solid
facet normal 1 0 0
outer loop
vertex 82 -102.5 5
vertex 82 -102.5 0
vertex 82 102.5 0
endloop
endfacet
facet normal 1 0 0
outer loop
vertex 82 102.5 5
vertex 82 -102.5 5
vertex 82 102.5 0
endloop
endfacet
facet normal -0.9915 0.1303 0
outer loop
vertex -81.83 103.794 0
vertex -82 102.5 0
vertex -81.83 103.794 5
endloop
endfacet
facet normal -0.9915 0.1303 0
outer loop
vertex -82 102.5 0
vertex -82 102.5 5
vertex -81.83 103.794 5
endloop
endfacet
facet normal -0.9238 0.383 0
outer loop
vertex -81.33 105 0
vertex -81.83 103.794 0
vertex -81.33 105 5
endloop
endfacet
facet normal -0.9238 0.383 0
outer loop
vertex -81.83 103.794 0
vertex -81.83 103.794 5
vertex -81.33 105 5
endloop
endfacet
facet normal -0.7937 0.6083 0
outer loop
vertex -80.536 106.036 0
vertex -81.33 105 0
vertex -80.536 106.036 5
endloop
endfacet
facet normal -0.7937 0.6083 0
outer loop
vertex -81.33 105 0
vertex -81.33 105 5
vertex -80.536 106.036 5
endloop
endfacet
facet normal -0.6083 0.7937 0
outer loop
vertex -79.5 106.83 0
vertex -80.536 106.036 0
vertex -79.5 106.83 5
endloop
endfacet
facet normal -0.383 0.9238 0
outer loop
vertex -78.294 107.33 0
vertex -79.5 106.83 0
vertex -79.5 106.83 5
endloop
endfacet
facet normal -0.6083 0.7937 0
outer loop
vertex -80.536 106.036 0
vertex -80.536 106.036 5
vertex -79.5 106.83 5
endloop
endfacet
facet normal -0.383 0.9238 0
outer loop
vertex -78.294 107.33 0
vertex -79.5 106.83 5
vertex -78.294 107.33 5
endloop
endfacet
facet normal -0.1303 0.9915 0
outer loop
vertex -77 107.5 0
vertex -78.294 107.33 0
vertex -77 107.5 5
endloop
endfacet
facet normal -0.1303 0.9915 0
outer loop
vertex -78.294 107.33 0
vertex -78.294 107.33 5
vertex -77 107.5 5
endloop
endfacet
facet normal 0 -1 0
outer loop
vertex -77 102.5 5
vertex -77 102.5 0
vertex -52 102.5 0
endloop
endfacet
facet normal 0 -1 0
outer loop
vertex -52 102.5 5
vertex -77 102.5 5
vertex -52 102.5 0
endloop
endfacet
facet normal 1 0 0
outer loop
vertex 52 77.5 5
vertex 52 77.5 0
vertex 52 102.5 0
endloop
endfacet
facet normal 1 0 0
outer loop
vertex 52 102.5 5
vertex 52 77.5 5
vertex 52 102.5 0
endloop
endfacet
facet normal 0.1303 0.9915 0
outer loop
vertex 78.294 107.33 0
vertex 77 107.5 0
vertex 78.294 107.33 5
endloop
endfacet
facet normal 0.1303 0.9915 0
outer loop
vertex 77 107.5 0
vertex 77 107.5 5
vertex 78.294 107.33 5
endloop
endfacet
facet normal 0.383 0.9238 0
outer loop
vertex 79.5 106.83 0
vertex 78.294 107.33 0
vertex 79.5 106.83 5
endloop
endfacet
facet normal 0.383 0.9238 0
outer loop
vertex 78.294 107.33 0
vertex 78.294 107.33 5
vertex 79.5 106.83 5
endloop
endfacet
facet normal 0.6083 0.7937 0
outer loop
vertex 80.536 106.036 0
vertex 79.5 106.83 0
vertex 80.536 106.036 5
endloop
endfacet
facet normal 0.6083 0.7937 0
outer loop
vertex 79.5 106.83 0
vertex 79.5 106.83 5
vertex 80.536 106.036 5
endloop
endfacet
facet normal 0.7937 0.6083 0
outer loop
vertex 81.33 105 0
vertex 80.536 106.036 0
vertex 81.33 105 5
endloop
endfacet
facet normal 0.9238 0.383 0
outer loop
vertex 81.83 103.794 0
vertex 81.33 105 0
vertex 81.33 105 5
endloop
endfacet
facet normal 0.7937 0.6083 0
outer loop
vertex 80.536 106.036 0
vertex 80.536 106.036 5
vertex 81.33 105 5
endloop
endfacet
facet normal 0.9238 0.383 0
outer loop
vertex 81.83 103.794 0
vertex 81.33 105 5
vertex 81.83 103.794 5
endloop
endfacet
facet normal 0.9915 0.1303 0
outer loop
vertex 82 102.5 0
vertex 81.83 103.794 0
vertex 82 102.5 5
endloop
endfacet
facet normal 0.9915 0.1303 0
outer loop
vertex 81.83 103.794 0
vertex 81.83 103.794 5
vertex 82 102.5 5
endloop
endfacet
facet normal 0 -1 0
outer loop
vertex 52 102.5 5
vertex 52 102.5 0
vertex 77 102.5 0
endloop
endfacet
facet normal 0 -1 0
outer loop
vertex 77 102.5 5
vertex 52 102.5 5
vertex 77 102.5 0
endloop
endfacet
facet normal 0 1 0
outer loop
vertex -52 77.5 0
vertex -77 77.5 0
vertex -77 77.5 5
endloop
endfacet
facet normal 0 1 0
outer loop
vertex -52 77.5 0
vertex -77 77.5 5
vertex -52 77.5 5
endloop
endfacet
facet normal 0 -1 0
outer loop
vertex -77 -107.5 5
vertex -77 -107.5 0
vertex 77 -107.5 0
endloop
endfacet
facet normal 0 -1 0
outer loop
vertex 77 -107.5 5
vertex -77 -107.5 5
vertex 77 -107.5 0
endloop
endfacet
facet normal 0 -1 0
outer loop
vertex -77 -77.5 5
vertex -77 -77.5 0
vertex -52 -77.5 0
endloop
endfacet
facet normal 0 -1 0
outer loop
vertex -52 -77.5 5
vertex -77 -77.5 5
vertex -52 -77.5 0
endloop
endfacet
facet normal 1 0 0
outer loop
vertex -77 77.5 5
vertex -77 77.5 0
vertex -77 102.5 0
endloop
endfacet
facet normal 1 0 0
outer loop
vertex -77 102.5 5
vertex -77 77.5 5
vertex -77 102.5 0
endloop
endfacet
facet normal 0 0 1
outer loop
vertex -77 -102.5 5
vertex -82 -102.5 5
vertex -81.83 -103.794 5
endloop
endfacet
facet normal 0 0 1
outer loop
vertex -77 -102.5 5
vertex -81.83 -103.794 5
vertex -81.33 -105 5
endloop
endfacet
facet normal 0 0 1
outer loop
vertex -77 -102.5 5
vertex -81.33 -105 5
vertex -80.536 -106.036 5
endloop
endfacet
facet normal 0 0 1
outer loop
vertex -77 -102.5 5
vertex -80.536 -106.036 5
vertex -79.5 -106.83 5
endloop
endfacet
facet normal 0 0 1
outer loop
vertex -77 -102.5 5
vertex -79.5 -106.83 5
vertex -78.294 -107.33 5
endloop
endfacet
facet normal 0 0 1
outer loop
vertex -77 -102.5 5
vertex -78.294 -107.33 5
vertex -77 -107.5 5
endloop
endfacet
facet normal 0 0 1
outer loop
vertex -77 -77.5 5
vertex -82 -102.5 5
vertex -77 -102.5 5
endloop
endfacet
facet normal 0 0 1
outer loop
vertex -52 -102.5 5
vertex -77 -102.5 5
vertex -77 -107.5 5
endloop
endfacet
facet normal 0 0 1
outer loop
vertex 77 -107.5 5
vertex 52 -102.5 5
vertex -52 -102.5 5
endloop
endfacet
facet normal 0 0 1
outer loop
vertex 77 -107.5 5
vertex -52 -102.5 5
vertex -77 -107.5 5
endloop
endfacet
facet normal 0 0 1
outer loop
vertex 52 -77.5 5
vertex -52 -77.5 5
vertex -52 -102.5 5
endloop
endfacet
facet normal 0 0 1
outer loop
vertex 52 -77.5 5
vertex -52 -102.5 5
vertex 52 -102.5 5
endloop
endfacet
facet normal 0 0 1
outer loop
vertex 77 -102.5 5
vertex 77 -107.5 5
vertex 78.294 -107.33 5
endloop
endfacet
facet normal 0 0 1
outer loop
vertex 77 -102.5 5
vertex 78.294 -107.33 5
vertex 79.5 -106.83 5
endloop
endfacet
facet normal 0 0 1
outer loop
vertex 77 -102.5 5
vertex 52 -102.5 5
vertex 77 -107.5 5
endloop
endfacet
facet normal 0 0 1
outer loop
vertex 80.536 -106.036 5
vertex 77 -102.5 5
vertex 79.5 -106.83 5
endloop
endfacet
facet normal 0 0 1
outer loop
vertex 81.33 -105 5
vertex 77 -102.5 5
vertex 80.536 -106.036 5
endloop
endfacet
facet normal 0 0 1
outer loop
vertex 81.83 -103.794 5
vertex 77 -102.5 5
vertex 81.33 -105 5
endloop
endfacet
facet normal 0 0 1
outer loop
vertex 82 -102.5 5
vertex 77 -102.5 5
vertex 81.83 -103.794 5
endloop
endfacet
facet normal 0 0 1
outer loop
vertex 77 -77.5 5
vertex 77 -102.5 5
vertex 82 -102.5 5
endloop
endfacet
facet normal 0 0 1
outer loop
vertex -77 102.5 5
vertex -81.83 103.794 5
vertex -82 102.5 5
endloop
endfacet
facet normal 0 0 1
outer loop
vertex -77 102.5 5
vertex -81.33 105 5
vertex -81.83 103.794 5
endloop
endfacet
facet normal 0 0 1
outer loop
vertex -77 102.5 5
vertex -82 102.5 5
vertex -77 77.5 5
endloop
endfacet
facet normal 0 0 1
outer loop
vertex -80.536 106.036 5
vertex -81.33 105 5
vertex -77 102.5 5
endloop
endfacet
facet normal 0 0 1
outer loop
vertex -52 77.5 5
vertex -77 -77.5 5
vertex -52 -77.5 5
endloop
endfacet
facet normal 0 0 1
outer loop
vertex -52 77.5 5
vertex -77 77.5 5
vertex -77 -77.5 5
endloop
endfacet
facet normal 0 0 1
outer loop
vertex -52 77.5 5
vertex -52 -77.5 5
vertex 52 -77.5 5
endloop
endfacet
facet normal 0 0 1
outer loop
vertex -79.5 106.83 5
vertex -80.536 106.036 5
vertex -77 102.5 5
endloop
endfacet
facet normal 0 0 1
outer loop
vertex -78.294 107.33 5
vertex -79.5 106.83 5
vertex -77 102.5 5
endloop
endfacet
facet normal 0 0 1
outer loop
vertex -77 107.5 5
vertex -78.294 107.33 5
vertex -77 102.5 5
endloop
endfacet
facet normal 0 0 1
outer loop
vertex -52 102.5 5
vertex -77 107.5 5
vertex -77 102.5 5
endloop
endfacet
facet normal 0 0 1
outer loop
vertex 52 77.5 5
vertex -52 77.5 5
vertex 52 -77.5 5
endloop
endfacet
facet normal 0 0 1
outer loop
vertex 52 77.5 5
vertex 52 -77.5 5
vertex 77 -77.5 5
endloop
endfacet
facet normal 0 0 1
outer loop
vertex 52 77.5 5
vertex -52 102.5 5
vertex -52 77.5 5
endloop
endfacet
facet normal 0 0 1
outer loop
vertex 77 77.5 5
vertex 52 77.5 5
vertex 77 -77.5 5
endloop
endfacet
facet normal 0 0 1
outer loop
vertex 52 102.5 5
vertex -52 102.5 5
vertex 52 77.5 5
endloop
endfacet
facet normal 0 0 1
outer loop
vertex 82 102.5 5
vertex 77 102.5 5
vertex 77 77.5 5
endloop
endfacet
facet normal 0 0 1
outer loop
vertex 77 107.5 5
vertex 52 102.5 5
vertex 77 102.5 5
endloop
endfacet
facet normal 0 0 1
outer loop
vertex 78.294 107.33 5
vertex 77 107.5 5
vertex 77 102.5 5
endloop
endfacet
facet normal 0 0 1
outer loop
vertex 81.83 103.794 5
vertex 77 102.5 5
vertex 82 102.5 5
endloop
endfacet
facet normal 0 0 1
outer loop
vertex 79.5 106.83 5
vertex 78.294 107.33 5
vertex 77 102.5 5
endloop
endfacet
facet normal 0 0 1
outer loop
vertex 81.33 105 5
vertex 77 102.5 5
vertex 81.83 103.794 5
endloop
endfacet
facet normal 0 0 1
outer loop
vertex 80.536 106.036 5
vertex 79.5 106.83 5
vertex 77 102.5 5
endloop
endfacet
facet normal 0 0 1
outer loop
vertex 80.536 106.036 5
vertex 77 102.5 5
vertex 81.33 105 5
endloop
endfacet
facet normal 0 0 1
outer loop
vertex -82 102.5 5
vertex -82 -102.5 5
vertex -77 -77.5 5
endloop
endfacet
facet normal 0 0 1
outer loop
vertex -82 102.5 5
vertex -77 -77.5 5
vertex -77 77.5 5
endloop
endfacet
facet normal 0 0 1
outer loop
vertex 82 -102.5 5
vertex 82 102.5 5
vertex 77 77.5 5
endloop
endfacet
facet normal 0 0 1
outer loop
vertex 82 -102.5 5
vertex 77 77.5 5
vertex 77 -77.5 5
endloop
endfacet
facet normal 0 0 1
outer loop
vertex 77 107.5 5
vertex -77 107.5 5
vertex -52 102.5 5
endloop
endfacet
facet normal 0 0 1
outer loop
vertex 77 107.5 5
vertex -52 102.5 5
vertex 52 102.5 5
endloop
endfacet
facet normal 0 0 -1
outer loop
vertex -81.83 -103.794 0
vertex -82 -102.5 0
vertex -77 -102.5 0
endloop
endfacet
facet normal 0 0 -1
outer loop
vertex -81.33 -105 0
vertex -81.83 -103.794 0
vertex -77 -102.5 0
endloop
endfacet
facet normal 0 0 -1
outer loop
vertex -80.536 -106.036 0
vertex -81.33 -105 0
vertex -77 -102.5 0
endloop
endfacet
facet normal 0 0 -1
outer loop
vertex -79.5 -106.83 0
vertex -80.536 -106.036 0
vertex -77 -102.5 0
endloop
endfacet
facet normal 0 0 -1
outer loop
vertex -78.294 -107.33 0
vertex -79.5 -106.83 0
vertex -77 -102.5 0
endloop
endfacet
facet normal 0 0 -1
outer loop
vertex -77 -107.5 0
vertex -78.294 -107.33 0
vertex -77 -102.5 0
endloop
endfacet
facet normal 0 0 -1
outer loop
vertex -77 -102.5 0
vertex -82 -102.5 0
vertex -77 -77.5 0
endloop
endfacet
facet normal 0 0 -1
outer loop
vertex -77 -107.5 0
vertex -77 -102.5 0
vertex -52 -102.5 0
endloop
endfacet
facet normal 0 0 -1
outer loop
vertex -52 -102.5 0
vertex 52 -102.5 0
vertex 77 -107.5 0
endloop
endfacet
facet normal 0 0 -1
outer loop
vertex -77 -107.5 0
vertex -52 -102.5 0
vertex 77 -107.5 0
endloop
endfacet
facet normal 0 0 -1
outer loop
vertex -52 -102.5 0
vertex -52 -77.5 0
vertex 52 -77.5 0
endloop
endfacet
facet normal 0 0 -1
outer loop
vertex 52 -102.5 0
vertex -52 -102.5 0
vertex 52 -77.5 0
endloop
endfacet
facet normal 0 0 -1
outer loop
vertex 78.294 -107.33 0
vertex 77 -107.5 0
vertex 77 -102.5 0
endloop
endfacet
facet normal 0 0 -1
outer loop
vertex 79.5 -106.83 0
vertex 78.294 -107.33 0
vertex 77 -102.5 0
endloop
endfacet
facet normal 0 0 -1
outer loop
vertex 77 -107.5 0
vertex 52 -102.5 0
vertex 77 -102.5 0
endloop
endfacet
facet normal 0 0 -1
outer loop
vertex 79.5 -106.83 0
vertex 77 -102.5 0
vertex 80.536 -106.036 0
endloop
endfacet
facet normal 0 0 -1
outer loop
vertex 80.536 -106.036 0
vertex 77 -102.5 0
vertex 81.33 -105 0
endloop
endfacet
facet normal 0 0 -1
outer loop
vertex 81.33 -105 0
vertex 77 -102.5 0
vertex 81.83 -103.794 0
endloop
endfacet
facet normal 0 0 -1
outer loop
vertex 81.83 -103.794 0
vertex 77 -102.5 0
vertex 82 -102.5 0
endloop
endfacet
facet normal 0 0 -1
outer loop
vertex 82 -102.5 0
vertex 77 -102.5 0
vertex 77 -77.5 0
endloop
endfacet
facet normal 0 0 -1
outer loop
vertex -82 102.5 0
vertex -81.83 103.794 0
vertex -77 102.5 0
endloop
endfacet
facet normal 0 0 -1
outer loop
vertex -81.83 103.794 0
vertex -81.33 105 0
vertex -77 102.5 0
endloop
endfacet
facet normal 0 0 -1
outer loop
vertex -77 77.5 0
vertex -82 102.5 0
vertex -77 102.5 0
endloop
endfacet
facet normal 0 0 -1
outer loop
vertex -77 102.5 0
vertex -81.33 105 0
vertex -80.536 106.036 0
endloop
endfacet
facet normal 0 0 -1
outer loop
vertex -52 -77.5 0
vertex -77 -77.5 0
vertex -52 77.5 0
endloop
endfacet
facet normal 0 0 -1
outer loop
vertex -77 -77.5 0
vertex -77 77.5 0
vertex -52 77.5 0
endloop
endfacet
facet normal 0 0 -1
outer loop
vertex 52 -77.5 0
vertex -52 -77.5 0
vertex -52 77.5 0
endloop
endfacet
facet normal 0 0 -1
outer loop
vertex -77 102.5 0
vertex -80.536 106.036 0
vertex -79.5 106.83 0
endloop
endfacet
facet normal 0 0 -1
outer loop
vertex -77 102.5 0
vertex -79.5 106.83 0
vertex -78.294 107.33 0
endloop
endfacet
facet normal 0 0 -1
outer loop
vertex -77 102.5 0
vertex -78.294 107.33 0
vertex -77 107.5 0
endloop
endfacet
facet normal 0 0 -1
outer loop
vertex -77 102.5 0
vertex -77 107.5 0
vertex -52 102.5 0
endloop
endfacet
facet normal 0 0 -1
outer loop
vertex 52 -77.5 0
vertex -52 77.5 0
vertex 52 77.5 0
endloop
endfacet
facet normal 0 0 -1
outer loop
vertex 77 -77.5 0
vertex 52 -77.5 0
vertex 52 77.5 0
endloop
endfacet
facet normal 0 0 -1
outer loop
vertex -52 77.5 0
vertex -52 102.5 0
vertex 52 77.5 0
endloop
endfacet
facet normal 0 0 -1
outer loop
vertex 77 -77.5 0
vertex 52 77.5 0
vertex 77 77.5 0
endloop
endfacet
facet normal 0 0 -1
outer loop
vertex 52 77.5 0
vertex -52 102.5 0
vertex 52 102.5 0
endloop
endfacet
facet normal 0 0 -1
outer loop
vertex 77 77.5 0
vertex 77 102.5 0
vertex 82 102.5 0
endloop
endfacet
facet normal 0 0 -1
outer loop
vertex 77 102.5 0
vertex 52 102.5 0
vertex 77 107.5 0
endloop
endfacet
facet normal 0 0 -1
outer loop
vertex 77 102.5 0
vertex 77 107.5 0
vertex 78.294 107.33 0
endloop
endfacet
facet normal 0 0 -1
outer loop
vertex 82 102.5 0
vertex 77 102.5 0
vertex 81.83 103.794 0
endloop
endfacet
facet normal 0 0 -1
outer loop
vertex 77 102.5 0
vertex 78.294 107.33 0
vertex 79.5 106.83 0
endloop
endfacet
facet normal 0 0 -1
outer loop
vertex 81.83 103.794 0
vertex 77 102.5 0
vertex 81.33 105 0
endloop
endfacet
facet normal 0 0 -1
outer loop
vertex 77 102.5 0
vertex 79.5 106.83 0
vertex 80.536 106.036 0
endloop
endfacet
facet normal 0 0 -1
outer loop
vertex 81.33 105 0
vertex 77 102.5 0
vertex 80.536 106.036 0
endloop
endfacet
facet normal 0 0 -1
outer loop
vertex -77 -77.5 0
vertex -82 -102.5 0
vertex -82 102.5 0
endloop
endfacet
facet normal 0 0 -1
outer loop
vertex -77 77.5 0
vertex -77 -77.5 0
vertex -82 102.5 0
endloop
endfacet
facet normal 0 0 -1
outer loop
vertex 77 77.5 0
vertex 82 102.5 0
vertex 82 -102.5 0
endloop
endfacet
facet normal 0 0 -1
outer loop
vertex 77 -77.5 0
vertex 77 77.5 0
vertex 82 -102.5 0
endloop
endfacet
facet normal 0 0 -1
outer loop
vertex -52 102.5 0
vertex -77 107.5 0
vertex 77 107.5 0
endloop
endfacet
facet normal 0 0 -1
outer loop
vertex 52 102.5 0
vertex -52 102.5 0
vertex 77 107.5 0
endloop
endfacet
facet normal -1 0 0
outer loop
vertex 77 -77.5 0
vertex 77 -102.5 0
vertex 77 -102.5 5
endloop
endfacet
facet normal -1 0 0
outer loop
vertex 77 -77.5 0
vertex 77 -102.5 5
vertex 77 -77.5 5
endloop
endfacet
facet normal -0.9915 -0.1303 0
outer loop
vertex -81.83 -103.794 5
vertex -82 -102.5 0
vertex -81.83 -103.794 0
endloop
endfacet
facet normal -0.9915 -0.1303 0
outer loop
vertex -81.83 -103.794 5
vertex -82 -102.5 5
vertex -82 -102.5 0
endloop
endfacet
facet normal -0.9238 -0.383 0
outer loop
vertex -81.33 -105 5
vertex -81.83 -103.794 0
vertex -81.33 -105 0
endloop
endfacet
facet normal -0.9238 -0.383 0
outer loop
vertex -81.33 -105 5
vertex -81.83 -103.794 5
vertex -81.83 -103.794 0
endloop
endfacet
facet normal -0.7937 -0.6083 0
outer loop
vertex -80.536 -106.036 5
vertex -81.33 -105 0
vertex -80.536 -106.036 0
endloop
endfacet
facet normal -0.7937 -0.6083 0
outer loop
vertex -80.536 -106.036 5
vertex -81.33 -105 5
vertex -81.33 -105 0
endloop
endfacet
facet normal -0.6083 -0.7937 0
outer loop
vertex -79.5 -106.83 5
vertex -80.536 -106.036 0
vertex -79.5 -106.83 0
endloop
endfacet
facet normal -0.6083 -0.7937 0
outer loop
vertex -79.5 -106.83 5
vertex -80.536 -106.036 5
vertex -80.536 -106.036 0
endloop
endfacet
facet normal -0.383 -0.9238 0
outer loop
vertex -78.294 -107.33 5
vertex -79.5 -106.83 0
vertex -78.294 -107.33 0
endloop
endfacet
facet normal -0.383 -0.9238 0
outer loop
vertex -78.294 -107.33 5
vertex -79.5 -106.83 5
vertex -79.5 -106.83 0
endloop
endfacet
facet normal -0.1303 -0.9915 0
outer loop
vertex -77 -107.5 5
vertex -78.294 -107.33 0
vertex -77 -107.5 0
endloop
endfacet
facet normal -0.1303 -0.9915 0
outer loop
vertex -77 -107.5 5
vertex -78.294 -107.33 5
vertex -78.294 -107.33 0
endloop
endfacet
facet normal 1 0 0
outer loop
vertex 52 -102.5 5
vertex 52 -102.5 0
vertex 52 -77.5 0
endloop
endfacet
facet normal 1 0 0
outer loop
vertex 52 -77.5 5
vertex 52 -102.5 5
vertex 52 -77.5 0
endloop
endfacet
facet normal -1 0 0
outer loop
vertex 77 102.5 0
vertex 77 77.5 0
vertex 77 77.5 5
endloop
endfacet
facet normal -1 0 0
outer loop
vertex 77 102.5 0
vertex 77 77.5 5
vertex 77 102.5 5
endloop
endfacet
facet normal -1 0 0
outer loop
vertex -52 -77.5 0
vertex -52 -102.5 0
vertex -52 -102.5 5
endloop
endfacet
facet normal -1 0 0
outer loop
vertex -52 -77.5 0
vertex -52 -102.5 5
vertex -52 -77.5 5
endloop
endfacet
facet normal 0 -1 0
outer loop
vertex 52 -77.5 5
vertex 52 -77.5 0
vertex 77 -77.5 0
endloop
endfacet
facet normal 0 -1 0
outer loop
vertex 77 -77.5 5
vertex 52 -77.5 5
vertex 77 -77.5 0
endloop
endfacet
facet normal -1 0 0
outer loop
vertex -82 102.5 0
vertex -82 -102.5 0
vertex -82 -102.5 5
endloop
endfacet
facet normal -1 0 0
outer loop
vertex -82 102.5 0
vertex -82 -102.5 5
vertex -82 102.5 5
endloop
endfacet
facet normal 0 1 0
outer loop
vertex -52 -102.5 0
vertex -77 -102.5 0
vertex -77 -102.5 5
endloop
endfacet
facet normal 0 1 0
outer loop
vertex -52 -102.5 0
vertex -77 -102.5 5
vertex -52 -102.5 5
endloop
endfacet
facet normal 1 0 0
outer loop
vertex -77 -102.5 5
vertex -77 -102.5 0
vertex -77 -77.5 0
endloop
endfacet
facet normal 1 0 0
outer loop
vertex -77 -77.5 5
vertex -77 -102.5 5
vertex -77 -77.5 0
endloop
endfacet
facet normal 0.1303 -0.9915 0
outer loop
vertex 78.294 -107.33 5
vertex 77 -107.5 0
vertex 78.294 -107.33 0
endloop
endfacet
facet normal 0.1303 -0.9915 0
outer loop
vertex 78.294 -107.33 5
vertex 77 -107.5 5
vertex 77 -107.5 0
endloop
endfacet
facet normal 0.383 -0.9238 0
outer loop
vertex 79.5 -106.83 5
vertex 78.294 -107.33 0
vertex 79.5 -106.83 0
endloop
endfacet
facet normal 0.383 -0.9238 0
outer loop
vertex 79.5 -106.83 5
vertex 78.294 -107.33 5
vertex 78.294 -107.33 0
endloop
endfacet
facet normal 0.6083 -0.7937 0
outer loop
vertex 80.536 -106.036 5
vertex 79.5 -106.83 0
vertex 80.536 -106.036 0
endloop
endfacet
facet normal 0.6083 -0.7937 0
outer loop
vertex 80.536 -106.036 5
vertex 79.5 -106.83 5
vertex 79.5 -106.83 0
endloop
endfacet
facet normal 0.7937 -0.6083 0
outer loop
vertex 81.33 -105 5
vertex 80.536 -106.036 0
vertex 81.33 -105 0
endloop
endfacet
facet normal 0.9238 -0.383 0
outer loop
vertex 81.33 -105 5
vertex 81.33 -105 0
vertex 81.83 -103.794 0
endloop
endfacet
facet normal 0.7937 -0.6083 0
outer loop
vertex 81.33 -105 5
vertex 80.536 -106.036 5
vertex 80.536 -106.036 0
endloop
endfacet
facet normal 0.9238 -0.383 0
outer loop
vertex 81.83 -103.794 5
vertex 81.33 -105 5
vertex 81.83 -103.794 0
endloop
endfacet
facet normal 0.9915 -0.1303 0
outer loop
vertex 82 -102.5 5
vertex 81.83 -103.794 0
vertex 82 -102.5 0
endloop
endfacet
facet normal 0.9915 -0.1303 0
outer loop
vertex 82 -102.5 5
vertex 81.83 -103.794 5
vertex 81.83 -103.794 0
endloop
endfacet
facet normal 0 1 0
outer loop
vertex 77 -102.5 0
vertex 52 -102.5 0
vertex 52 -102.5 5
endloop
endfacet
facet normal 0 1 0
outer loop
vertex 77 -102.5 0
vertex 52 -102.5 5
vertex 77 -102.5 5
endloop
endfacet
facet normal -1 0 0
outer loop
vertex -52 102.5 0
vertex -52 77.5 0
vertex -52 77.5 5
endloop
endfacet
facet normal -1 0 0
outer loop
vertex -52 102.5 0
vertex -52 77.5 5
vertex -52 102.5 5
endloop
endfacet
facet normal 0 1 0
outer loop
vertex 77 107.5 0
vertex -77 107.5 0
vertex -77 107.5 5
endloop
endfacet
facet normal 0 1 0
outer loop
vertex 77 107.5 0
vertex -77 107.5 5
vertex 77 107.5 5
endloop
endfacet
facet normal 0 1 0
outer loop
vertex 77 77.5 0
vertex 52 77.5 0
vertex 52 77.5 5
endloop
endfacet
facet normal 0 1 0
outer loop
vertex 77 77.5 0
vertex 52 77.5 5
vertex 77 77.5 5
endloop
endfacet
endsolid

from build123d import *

# Parameters (mm, degrees)
ESQUISSE1_W             = 164
ESQUISSE1_H             = 215
BOSS_EXTRU_1_DEPTH      = 5
ESQUISSE2_W             = 25
ESQUISSE2_H             = 25
ENL_V_MAT_EXTRU_1_DEPTH = 5
CONG_1_R                = 5


with BuildPart() as part:
    # Esquisse1 → Boss.-Extru.1 (new body)
    with BuildSketch(Plane.XY):
        Rectangle(ESQUISSE1_W, ESQUISSE1_H)
    extrude(amount=BOSS_EXTRU_1_DEPTH)

    # Esquisse2 → Enlèv. mat.-Extru.1 (cut)
    with BuildSketch(Plane.XY):
        with Locations((-64.5, 90)):
            Rectangle(ESQUISSE2_W, ESQUISSE2_H)
        with Locations((64.5, 90)):
            Rectangle(ESQUISSE2_W, ESQUISSE2_H)
        with Locations((64.5, -90)):
            Rectangle(ESQUISSE2_W, ESQUISSE2_H)
        with Locations((-64.5, -90)):
            Rectangle(ESQUISSE2_W, ESQUISSE2_H)
    extrude(amount=ENL_V_MAT_EXTRU_1_DEPTH, mode=Mode.SUBTRACT)

    # Congé1
    cong_1_edges = [part.edges().sort_by_distance(p)[0] for p in [
        (-82, 107.5, 2.5),
        (82, 107.5, 2.5),
        (82, -107.5, 2.5),
        (-82, -107.5, 2.5),
    ]]
    fillet(cong_1_edges, radius=CONG_1_R)


solid = part.part
